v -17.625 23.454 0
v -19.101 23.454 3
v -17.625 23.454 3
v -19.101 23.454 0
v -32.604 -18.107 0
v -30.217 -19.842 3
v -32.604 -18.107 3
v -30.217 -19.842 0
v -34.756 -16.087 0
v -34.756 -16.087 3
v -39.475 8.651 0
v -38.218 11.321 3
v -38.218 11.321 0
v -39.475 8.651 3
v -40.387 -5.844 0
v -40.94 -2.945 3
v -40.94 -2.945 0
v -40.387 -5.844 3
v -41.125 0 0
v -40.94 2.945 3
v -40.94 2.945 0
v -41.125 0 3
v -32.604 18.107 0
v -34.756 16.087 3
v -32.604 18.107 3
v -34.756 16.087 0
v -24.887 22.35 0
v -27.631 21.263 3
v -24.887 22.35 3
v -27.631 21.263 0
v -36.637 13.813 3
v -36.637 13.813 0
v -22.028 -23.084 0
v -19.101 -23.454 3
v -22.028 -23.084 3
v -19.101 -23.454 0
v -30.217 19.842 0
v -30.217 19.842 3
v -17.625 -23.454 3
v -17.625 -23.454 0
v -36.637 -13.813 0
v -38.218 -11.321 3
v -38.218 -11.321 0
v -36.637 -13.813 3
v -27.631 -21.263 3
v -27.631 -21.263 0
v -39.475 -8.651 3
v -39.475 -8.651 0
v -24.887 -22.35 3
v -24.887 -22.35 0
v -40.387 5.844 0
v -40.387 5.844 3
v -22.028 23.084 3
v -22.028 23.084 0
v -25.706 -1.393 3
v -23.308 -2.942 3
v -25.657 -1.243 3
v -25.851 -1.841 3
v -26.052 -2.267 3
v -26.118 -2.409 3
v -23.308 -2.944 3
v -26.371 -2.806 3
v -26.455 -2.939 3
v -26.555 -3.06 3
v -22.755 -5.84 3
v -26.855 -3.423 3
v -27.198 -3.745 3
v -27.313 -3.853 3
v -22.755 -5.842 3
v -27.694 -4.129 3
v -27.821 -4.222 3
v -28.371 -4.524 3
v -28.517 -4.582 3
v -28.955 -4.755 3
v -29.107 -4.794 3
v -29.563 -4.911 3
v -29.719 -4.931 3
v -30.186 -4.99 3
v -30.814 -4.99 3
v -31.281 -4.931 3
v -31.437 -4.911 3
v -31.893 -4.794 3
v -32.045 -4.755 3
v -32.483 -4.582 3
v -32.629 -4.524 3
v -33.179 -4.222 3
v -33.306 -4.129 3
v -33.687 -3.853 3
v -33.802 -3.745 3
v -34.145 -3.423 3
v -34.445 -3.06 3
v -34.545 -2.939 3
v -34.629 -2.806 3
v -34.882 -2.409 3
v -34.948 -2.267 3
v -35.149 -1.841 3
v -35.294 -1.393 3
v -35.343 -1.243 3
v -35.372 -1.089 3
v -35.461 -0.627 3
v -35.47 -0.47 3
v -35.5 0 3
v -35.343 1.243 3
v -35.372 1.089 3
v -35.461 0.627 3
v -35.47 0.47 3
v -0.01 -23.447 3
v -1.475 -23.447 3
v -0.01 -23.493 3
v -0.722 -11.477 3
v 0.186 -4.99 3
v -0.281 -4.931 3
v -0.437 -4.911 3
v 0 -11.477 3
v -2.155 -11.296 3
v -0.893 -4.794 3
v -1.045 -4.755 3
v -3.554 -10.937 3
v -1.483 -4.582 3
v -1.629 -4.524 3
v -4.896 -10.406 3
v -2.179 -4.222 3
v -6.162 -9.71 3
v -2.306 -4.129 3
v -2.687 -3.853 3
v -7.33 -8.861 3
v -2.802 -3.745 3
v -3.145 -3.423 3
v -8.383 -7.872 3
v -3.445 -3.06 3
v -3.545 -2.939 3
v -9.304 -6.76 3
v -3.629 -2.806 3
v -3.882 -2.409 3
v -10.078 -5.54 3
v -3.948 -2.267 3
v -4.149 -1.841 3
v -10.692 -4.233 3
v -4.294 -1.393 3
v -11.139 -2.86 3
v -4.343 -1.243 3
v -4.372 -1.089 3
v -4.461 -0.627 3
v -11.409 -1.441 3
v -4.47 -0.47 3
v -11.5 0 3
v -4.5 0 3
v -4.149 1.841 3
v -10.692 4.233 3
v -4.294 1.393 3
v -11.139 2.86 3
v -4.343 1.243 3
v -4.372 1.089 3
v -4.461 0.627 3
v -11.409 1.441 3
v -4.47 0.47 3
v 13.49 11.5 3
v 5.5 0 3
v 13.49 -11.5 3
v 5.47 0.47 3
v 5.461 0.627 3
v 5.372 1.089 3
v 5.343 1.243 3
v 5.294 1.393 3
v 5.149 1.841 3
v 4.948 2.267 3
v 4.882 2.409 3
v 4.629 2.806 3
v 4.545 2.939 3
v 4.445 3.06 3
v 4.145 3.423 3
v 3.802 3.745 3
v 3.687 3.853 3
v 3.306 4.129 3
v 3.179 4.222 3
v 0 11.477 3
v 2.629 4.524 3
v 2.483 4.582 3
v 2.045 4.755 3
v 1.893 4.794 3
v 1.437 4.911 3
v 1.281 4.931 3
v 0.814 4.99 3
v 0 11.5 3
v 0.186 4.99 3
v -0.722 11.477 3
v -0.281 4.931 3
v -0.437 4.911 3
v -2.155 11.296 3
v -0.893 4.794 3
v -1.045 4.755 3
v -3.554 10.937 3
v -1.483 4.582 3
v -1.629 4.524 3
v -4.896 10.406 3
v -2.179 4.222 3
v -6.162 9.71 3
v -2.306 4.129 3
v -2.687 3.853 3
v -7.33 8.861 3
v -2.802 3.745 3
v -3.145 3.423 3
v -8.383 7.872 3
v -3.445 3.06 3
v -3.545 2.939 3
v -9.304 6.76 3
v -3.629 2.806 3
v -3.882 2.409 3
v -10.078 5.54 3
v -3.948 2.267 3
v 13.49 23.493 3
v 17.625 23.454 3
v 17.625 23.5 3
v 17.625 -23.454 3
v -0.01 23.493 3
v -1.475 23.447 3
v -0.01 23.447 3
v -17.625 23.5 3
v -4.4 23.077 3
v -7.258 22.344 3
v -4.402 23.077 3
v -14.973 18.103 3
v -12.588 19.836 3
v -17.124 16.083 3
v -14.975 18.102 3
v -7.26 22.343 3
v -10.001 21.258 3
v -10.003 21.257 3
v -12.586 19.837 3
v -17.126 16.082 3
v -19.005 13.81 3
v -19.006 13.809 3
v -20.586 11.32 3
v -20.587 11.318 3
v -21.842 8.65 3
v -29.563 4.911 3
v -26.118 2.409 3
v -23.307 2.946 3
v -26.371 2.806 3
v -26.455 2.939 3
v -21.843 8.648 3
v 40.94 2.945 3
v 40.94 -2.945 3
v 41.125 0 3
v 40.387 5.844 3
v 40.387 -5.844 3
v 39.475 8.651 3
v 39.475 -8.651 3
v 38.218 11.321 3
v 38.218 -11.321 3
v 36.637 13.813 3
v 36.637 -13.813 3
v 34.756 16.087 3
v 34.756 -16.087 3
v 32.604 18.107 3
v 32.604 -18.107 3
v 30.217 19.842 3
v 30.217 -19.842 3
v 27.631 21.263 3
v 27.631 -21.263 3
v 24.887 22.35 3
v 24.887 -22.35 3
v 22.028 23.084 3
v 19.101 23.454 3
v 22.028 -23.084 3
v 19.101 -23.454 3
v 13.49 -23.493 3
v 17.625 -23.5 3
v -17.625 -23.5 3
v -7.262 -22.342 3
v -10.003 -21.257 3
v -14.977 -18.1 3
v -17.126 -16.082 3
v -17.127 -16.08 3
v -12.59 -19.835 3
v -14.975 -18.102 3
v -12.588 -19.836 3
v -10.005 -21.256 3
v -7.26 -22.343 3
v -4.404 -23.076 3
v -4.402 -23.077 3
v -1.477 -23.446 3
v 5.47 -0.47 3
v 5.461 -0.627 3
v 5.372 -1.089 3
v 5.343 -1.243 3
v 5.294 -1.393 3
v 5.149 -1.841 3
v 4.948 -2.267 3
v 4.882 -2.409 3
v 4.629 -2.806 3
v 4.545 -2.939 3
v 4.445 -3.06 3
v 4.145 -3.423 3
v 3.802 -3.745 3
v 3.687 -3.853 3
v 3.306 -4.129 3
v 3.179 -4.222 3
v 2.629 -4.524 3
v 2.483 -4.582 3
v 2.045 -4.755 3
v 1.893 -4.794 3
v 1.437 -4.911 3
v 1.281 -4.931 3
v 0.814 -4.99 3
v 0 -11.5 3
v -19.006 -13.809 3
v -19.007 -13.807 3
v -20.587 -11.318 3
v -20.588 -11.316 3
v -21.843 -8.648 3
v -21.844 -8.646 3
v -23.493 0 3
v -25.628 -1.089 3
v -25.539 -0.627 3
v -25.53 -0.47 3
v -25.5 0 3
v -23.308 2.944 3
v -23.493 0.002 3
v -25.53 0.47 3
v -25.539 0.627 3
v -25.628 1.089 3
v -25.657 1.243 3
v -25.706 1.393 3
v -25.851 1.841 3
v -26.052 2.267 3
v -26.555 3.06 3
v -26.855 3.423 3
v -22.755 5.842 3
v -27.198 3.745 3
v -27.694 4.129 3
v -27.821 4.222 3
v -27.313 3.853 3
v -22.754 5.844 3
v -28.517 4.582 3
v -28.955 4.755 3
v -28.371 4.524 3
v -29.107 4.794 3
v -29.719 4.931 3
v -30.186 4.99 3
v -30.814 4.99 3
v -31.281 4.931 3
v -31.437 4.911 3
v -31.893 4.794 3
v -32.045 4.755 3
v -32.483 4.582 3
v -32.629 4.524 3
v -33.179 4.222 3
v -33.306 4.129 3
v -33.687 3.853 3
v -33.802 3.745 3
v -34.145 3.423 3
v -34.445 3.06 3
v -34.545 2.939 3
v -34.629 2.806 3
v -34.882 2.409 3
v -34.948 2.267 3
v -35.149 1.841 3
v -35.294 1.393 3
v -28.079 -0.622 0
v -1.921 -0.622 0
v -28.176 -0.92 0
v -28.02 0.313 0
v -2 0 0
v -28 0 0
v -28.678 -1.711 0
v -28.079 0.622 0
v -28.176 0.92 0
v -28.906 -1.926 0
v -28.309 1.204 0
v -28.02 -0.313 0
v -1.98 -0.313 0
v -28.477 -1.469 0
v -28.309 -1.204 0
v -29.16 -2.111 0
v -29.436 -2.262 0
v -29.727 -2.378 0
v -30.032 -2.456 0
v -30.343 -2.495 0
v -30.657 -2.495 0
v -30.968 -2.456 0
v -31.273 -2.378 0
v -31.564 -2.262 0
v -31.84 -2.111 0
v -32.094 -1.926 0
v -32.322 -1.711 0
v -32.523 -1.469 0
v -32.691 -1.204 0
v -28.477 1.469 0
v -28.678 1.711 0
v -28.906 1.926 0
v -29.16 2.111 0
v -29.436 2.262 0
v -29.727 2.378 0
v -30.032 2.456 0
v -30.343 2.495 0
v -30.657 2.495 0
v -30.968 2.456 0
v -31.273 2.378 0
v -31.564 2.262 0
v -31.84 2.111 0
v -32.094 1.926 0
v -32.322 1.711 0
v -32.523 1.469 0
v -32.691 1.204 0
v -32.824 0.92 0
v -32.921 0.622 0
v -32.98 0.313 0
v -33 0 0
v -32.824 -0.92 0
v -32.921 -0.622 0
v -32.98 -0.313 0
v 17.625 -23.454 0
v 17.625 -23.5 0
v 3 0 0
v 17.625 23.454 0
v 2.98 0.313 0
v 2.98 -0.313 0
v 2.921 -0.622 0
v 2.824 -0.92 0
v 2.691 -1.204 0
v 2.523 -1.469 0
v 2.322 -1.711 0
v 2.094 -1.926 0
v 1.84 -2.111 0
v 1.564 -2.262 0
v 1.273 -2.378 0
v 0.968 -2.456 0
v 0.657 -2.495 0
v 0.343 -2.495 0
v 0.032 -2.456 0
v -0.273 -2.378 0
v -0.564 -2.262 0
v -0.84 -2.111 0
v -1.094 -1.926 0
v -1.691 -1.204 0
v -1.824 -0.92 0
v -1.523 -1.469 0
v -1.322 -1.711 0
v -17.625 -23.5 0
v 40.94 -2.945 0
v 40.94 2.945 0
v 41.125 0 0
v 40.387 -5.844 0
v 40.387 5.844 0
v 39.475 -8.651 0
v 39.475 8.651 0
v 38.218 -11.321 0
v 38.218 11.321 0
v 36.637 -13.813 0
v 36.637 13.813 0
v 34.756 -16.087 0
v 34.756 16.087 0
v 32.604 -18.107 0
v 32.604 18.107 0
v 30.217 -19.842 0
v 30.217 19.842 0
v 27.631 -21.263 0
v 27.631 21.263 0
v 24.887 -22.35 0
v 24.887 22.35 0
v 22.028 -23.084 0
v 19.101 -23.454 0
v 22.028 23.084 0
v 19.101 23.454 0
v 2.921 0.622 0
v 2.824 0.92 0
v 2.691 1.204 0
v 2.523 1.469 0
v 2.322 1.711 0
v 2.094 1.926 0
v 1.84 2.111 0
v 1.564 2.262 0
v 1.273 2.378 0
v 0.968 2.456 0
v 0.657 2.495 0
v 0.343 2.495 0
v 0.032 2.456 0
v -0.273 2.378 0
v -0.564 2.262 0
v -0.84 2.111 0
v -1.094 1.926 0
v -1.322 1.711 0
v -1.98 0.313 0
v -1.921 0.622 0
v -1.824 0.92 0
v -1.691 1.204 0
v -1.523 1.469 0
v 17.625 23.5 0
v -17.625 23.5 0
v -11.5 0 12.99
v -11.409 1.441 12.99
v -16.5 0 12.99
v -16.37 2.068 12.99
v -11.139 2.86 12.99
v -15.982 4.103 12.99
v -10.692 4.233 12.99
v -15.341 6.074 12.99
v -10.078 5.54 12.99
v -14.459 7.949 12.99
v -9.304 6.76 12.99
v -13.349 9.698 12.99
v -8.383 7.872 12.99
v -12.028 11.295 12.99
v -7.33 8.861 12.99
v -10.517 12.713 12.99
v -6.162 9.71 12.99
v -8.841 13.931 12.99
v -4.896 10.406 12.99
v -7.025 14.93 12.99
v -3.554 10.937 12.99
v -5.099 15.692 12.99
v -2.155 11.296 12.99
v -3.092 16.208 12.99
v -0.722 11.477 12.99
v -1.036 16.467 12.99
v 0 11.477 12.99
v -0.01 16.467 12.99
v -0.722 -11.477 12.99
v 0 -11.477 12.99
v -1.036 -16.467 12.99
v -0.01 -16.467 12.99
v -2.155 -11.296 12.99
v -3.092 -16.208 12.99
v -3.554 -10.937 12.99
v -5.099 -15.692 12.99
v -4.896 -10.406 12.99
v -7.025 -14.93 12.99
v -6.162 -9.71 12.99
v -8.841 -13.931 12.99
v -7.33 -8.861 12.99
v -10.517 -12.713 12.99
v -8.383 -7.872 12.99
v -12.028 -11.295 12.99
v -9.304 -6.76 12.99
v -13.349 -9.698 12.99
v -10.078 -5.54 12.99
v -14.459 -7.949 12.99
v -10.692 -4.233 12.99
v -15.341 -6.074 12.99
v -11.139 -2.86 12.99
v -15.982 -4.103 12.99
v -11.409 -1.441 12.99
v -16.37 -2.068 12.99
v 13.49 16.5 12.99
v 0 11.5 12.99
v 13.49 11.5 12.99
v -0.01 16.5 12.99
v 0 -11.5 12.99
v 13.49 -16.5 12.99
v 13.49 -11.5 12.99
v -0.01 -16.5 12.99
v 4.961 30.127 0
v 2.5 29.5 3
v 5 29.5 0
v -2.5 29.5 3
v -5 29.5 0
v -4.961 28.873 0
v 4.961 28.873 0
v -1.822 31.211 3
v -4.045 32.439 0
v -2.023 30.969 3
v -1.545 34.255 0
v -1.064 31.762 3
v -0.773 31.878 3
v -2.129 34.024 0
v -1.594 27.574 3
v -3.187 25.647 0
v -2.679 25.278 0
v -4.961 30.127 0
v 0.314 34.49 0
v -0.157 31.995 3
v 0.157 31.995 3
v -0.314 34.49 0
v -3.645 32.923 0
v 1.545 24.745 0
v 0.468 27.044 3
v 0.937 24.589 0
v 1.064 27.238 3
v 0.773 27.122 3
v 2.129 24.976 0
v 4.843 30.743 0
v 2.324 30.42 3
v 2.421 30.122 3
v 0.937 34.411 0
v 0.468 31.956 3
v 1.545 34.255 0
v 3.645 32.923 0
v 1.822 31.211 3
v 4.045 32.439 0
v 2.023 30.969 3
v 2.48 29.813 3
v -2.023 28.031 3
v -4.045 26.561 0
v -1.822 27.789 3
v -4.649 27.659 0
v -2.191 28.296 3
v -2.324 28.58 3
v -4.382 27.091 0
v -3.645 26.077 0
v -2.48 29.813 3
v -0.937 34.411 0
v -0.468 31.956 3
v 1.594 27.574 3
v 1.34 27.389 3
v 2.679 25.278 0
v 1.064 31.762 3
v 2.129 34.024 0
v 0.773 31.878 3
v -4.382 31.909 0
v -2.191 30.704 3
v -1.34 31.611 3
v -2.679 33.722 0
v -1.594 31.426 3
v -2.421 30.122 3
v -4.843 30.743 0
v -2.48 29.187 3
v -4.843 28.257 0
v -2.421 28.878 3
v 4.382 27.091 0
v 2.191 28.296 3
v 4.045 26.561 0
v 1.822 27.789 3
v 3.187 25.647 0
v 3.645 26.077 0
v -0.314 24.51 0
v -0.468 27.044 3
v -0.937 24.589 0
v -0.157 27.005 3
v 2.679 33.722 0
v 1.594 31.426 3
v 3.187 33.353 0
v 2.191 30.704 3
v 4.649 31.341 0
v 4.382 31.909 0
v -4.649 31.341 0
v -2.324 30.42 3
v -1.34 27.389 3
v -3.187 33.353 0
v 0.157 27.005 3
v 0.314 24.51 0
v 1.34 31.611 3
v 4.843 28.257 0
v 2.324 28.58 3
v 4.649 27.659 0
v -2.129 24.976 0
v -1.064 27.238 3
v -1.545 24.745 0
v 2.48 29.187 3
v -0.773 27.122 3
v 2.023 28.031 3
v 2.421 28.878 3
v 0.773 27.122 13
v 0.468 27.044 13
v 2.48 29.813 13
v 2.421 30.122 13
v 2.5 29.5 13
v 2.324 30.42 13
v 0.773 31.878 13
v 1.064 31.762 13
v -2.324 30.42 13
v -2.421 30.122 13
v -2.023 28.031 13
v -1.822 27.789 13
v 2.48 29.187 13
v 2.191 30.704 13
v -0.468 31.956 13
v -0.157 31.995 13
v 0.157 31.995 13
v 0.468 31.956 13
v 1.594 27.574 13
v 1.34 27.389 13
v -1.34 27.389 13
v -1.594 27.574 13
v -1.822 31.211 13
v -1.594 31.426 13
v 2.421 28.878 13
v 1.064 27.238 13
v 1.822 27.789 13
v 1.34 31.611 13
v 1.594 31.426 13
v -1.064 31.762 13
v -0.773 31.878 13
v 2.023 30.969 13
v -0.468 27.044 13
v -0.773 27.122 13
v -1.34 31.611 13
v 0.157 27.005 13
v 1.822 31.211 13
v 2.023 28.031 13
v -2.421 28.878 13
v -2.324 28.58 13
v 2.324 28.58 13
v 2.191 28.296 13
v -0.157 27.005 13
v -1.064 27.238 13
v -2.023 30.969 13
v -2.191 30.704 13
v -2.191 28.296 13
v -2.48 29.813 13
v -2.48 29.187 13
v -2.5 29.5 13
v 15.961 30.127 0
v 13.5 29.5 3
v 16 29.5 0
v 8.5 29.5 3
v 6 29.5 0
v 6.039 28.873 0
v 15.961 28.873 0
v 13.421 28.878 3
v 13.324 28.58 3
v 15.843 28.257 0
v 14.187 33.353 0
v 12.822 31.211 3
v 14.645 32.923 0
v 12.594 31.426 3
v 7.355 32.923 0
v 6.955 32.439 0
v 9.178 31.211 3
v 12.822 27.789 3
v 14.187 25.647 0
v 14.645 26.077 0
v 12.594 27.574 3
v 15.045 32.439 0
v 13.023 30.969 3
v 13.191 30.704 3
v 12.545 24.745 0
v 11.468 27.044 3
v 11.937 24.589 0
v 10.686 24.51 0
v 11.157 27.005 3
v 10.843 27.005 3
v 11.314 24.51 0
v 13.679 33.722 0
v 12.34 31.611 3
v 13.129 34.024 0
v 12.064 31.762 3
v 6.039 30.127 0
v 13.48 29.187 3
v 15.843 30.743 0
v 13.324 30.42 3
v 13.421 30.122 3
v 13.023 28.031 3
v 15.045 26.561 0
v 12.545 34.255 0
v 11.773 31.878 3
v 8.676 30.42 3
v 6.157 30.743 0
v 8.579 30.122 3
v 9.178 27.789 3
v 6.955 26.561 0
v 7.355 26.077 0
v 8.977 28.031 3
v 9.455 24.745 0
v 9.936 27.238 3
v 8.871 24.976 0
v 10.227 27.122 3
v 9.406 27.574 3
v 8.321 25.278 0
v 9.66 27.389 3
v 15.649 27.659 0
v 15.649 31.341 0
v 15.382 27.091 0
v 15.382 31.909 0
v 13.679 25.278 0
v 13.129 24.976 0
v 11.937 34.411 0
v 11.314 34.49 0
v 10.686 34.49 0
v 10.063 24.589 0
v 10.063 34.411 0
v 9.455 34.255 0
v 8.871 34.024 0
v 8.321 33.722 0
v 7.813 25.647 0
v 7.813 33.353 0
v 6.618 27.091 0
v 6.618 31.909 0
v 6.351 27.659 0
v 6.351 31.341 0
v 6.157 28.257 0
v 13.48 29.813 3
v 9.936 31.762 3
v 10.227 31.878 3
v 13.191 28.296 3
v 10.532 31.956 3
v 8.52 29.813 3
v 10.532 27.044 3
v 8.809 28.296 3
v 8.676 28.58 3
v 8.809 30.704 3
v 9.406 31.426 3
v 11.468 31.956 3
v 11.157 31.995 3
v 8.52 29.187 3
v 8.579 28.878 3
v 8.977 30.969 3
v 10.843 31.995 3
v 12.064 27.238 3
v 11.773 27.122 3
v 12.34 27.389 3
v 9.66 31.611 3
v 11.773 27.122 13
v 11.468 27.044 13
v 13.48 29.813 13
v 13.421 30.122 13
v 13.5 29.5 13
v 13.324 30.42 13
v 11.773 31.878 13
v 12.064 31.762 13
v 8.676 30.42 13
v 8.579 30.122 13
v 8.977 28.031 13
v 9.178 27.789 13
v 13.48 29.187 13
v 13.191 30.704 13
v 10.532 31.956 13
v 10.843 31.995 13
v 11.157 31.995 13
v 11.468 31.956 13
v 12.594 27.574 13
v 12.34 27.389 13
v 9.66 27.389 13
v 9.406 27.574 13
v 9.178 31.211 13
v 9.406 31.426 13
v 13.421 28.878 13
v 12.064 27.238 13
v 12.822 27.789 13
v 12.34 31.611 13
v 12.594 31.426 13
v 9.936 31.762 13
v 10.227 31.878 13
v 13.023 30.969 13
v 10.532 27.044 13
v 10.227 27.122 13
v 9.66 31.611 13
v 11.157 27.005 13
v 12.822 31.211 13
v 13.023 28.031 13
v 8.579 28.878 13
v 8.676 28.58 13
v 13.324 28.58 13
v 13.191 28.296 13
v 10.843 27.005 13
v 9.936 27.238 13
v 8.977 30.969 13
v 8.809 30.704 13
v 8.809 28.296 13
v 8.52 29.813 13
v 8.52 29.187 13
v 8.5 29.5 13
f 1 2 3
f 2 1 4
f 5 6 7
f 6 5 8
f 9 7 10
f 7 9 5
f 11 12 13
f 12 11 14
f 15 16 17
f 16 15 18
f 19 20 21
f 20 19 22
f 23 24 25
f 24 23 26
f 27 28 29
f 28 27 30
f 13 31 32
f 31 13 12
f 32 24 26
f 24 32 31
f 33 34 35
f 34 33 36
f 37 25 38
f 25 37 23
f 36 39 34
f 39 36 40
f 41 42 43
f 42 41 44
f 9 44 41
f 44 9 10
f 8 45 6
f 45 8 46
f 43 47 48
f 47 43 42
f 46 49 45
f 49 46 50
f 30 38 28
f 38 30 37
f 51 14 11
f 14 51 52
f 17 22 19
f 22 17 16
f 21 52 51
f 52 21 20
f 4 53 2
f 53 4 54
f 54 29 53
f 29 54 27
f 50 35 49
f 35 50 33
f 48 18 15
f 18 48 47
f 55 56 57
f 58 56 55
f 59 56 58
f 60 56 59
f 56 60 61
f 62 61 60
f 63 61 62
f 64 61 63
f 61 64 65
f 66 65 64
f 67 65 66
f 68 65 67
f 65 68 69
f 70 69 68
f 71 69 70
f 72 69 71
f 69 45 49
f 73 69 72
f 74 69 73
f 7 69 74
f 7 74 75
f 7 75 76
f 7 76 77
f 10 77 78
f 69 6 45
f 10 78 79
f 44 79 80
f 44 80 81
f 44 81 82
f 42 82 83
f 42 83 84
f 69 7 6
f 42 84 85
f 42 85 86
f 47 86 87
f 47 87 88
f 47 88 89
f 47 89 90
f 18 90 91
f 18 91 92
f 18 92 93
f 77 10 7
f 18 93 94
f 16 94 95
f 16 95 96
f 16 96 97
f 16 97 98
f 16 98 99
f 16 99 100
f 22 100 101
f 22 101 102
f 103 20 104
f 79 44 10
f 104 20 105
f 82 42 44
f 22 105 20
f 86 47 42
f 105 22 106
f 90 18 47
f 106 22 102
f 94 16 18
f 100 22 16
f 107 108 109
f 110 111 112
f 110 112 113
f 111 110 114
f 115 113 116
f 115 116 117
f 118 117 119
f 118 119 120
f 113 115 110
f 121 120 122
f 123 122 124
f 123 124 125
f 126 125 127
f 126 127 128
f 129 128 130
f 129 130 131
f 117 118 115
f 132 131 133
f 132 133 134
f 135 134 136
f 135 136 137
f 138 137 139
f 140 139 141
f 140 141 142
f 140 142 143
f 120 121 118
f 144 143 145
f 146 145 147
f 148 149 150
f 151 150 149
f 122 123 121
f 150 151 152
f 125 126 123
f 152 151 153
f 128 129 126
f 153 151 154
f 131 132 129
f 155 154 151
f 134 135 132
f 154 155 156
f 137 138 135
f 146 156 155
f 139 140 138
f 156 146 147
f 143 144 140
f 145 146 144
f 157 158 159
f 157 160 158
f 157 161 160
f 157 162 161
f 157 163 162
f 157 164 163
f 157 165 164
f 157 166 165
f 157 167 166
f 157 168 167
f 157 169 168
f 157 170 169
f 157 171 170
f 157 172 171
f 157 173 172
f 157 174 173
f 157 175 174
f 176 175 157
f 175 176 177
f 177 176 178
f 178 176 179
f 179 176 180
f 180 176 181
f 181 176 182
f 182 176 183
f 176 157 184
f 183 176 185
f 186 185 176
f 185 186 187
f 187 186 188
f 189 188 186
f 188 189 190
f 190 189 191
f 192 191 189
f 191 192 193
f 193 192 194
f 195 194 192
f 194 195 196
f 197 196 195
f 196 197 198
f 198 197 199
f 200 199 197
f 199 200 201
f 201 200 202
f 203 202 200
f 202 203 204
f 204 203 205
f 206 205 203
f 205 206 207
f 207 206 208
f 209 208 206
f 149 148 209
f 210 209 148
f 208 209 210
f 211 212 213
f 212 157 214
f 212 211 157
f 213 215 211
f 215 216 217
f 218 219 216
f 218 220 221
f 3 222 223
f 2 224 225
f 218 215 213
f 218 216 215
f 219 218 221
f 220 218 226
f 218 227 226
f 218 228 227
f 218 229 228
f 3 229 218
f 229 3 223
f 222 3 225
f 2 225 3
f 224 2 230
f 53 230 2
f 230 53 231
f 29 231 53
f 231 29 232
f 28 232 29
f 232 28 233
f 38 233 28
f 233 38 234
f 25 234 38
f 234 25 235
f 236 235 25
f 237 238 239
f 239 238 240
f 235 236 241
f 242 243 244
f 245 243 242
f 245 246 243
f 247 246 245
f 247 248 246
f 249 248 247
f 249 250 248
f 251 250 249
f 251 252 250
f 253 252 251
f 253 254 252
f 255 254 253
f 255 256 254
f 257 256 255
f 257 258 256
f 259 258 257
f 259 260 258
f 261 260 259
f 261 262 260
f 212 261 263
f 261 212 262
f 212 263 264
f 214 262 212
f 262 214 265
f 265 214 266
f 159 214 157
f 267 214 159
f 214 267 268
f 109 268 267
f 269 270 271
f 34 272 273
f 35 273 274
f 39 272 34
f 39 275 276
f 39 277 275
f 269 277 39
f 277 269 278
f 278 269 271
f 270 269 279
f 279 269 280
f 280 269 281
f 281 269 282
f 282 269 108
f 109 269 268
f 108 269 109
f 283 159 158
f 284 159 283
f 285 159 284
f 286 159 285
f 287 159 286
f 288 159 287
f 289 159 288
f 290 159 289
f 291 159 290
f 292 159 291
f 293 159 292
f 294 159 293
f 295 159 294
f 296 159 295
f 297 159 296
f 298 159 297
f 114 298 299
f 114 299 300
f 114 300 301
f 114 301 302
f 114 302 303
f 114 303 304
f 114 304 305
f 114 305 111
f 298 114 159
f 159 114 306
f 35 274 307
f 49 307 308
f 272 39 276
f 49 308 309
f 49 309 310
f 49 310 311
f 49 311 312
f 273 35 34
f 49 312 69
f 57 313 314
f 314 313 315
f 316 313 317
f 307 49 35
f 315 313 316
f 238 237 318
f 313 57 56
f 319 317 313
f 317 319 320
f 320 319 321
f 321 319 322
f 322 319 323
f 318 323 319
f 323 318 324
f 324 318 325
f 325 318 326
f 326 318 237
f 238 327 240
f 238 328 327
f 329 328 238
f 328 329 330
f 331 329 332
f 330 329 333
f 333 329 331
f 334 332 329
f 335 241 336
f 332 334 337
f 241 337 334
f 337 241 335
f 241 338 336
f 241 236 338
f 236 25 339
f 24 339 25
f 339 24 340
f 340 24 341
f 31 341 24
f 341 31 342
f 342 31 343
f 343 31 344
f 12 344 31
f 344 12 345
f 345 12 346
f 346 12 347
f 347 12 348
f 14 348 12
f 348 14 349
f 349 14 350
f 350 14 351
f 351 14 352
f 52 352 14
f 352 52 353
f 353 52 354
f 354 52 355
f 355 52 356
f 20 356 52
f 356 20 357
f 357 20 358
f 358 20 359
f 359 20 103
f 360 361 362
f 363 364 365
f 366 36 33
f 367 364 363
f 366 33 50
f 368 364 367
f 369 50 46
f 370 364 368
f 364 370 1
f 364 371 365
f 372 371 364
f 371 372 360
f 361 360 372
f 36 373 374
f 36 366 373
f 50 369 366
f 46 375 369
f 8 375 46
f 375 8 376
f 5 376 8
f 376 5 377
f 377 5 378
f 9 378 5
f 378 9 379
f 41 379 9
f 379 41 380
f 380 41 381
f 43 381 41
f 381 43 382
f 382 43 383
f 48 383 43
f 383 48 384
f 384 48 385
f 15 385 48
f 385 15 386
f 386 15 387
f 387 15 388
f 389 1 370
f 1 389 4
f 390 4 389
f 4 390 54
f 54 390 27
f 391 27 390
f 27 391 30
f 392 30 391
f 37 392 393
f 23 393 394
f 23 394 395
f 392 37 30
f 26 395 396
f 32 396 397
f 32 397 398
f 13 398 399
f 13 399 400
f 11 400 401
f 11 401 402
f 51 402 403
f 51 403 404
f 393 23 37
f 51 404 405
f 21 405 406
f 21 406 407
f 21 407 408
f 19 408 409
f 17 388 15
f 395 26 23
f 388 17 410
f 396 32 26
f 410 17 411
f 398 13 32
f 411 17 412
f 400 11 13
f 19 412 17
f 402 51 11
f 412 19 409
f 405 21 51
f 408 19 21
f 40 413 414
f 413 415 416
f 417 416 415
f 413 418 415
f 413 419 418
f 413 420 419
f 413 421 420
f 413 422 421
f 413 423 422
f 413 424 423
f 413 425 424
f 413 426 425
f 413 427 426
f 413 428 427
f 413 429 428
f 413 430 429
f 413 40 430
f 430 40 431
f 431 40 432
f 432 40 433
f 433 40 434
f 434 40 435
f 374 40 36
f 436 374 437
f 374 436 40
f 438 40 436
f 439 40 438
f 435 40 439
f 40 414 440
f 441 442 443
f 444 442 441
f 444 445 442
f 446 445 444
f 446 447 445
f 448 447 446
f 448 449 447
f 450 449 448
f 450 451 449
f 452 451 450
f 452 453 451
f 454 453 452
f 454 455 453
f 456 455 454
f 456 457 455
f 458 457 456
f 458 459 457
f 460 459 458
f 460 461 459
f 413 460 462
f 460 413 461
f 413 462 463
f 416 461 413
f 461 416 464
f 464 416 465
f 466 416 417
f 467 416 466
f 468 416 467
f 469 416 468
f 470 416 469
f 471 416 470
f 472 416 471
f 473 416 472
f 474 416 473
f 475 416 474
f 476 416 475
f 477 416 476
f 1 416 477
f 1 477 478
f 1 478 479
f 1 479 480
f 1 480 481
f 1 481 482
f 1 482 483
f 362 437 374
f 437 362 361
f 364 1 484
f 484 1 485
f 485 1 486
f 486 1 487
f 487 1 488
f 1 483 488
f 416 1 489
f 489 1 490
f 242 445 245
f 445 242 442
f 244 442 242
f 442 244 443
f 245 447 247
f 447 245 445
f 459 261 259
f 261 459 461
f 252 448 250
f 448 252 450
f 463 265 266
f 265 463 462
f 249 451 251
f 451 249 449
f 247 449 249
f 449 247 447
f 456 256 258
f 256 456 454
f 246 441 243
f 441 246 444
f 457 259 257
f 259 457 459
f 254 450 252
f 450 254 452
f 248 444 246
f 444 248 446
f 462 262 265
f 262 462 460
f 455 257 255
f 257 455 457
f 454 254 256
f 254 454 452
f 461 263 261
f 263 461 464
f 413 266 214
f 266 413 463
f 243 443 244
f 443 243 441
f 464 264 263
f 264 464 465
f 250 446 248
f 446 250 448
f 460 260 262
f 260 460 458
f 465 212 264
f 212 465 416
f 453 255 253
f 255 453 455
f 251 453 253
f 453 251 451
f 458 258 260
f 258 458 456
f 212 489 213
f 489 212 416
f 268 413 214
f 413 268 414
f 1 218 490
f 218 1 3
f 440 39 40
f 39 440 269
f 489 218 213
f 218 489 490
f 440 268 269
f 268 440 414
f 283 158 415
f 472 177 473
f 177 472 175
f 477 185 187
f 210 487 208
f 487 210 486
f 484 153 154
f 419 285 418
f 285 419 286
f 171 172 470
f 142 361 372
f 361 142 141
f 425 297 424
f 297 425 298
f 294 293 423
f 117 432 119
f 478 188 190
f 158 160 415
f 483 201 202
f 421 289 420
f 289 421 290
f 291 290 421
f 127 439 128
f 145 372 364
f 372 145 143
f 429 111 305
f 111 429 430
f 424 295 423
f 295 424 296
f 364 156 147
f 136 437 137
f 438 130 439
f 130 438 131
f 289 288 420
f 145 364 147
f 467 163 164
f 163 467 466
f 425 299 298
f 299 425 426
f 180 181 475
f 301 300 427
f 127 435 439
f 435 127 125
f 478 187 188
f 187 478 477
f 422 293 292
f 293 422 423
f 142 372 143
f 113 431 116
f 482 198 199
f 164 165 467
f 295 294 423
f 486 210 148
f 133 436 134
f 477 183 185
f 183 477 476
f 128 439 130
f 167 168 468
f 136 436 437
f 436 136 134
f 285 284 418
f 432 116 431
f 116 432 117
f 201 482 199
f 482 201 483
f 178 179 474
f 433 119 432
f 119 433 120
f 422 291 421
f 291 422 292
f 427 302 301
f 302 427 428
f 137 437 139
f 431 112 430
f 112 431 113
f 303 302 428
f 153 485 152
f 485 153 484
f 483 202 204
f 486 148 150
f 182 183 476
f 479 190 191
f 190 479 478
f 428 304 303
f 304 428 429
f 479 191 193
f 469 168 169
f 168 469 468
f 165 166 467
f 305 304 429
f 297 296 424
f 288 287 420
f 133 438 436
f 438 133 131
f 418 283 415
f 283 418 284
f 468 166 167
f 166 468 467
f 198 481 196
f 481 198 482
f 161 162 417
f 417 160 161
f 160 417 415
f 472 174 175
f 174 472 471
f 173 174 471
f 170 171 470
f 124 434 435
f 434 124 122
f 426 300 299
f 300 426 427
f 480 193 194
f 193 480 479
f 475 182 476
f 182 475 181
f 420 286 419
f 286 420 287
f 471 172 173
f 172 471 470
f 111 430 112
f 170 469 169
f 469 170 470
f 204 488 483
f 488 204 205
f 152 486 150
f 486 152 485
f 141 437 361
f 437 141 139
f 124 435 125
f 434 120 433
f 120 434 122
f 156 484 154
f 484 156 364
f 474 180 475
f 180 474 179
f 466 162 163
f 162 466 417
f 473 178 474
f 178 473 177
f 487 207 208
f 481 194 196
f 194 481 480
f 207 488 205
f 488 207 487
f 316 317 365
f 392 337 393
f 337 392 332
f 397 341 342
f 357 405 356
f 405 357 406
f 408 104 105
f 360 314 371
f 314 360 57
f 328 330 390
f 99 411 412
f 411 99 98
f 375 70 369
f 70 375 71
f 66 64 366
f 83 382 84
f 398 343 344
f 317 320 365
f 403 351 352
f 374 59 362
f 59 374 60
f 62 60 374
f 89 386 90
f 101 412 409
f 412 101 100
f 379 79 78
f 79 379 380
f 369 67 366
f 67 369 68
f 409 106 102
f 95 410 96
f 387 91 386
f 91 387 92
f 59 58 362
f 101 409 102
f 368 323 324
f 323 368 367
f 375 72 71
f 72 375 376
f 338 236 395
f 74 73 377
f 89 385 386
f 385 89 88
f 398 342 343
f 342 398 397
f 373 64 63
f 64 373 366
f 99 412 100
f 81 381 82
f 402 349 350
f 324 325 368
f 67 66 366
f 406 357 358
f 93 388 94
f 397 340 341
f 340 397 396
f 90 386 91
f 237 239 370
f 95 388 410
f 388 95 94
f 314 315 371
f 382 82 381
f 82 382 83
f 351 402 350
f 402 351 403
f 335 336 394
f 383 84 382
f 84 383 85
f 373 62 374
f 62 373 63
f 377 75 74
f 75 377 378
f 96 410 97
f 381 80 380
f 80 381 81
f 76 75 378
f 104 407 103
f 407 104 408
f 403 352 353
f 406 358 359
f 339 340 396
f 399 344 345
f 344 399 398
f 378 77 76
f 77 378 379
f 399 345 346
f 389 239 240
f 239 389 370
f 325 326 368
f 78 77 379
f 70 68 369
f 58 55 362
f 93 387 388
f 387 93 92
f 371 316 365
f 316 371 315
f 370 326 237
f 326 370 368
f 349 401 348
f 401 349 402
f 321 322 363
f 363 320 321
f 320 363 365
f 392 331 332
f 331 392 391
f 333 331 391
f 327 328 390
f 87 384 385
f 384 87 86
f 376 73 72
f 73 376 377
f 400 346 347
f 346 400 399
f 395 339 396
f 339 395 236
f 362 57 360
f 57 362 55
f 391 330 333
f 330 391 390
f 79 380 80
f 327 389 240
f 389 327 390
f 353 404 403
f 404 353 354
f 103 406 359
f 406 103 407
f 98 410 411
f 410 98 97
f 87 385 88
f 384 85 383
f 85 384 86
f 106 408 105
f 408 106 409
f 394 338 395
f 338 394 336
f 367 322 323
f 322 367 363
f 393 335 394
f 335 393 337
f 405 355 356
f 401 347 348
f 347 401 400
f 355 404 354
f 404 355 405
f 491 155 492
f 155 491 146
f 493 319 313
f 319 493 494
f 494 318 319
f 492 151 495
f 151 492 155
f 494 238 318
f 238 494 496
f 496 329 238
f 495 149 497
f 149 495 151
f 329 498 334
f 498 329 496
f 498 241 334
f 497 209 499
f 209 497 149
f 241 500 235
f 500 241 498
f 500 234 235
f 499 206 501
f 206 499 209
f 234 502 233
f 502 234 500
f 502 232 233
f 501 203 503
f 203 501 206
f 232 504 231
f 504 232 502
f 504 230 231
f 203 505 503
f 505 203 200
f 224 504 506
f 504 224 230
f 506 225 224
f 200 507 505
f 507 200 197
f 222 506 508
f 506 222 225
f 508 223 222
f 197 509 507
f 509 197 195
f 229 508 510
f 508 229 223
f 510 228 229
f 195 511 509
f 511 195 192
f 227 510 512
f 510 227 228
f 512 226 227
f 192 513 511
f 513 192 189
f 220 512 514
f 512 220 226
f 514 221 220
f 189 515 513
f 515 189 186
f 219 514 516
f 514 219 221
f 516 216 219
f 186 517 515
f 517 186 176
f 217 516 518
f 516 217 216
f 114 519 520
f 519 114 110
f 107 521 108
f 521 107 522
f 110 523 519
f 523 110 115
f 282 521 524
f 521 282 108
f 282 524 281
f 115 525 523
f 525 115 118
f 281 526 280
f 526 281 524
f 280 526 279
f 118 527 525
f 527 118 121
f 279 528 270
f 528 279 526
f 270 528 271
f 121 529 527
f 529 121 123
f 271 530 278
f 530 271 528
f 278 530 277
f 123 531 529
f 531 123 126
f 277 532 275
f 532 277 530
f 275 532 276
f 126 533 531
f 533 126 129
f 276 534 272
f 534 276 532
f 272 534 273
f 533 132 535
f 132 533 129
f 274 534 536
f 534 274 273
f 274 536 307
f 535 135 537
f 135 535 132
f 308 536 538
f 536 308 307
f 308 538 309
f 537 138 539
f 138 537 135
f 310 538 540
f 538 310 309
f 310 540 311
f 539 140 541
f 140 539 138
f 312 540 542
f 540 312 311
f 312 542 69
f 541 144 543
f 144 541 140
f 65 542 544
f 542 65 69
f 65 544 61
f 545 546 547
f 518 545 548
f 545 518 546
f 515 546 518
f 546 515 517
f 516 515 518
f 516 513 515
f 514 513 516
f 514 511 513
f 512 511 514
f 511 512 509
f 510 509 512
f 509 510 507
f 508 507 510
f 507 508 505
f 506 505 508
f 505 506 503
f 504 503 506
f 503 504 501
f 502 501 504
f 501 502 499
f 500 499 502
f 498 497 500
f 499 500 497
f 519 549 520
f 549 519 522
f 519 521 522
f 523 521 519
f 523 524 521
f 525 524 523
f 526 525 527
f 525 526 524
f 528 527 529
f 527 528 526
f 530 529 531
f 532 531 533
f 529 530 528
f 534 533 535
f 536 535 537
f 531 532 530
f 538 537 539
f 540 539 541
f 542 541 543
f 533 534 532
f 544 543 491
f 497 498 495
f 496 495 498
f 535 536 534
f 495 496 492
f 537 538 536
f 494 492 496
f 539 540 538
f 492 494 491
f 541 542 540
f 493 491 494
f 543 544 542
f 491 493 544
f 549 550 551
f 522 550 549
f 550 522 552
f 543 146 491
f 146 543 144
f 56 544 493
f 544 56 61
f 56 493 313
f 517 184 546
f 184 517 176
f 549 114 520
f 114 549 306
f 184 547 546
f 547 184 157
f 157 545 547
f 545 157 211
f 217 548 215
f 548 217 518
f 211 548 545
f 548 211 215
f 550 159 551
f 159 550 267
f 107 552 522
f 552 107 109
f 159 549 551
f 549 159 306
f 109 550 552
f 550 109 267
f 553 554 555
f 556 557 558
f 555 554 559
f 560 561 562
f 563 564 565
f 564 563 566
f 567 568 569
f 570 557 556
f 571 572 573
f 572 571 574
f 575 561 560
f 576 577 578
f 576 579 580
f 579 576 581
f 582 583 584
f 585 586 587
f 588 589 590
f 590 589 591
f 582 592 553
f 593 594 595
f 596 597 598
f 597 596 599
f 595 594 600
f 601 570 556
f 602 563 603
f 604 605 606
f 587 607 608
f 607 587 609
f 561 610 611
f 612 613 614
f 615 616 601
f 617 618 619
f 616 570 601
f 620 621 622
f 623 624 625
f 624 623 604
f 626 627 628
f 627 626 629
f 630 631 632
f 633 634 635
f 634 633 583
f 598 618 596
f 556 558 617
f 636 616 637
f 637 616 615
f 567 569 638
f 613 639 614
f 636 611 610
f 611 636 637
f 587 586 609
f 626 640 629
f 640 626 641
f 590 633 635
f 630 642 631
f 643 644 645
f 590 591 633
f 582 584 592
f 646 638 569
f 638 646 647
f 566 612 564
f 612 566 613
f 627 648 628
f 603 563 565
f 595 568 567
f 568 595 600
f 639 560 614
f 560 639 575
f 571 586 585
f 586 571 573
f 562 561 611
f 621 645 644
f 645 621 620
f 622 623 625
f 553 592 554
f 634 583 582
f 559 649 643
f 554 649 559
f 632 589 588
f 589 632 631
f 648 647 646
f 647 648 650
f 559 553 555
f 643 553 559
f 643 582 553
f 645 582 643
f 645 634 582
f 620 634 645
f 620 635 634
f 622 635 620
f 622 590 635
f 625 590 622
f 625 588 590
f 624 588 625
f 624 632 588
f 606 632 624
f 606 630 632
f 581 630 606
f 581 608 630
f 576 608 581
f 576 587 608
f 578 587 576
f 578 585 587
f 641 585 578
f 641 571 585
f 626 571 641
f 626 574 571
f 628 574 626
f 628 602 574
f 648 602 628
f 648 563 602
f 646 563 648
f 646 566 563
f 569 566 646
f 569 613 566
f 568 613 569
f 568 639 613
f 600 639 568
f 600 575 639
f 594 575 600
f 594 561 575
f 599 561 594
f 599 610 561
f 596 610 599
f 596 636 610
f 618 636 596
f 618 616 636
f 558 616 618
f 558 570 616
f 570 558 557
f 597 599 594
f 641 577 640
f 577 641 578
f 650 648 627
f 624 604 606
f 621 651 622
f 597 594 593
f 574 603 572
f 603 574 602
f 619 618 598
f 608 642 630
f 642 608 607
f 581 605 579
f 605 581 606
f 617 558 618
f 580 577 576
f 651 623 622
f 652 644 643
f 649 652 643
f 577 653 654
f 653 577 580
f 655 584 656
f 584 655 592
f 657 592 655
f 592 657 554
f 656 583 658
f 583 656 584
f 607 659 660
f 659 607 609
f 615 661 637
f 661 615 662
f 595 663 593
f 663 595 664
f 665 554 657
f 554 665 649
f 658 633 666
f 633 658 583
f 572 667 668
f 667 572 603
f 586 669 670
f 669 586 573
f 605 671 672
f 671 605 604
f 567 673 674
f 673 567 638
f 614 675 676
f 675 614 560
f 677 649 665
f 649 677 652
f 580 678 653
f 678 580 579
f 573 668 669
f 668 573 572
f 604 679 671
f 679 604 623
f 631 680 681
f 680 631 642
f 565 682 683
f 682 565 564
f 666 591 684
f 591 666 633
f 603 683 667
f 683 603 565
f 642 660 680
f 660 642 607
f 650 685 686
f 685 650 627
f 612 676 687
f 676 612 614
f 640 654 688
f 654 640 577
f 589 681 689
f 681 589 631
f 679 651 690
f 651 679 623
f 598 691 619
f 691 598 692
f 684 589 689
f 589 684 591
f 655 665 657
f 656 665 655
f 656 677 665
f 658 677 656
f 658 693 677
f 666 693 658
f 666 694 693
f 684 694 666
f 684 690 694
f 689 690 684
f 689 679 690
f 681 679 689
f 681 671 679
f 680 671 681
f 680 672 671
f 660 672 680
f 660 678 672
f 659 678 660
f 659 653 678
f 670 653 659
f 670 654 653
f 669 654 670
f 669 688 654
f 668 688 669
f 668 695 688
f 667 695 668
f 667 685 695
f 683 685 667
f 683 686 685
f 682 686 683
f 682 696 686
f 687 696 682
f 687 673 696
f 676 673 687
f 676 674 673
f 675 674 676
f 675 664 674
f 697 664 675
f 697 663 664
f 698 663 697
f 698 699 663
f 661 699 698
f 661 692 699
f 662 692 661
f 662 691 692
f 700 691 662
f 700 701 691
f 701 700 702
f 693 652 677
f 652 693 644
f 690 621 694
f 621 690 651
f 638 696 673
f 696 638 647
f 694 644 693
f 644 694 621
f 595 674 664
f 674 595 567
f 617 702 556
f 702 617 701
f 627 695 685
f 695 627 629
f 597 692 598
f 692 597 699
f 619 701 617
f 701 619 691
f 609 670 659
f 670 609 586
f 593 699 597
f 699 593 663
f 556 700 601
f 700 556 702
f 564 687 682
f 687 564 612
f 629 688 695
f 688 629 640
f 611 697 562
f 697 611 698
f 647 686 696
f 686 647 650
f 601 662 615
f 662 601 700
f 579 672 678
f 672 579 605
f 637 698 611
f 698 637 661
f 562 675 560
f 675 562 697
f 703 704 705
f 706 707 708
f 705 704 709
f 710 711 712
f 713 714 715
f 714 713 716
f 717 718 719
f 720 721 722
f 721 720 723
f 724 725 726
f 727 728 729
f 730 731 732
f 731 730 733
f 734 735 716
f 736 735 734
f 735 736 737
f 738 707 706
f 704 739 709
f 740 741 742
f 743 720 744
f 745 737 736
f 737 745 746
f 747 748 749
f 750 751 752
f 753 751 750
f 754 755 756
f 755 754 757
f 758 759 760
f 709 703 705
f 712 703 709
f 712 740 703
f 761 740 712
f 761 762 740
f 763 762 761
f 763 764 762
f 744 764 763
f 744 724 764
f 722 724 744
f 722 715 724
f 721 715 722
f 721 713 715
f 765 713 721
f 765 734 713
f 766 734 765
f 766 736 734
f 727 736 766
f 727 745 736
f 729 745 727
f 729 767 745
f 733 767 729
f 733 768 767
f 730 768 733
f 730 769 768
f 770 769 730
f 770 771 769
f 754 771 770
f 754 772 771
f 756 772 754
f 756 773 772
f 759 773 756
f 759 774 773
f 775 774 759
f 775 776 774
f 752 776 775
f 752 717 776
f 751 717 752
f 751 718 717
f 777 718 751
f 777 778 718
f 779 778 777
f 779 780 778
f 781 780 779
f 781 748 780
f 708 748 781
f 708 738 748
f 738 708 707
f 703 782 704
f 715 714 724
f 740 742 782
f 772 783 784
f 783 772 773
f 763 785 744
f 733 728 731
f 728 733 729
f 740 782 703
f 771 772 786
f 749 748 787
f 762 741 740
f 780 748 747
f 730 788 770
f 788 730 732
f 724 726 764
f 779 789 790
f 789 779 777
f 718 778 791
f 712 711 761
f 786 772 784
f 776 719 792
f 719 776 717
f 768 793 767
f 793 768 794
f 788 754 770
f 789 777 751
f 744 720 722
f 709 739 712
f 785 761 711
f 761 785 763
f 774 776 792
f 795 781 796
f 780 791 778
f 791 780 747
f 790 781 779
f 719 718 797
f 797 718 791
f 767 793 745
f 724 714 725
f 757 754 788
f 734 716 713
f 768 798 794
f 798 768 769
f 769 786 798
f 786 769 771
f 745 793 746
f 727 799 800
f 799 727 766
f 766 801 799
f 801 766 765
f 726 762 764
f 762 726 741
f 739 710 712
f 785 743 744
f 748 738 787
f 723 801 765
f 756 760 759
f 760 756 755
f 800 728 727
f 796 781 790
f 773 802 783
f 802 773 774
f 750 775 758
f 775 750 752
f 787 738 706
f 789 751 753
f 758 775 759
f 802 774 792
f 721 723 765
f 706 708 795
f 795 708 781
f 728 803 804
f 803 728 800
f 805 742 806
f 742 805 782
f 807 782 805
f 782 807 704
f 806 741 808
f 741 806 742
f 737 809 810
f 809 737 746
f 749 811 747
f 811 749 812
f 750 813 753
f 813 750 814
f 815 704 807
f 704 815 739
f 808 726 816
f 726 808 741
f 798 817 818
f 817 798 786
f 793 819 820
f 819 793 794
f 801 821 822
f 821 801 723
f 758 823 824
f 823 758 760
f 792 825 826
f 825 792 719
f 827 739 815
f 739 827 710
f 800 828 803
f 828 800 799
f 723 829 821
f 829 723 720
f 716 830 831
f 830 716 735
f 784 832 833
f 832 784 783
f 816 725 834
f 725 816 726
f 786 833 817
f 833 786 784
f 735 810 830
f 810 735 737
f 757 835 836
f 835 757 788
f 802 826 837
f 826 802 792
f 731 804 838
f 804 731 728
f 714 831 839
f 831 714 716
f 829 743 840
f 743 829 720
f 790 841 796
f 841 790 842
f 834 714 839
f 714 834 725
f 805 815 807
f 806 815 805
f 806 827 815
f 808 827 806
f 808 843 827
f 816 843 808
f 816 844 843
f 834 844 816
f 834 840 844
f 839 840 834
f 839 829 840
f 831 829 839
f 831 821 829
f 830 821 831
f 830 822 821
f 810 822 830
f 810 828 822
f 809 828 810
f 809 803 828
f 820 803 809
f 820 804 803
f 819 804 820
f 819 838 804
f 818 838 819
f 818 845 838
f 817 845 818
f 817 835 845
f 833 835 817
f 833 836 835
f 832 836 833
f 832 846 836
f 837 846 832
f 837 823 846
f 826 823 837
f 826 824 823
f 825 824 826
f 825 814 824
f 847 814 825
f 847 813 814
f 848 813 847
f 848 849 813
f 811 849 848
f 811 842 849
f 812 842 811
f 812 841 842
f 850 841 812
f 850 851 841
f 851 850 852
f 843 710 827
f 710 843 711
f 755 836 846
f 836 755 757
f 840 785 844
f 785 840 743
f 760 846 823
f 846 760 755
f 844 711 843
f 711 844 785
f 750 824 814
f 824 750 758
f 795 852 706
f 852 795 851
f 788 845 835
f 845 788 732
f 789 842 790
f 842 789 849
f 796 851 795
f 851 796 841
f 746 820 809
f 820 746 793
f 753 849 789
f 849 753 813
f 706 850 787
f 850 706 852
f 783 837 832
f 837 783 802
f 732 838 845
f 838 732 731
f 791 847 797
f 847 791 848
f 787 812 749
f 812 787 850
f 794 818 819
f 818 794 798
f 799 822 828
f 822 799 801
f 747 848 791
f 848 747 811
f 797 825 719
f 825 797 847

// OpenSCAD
//  Closet bar holder 
// version 2 - Added support for boxes.scad 
// version 1 - Original
$fn = 50;
include <MCAD/boxes.scad>  // from https://github.com/elmom/MCAD/blob/master/boxes.scad

// this is how big we want the opening to be
// the wooded pole for my closet was 33mm diamater so I made the opening 36mm

bar_radius = 23/2;
plug_depth = 10;
plug_radius = 2.5;
plug_distance = 26; // distance inbetween plugs
plugs_offset = -15; 

holder_bottom_thns = 12; //9; //
holder_top_thns = 5;
base_width = bar_radius*2+holder_bottom_thns*2;
base_depth = 3;

o = 0.01; // slight overlap
distance = 1;


base();
translate([0,0,base_depth-o]) holder();

translate([0,base_width/2+plug_radius*2+distance,0]) {
  plug();
  translate([plug_radius*4+distance,0,0]) plug();
}

// this is the piece that sticks out to holds the bar
// we will be extruding this
module wall_mold() { 
  polygon(points=[[0,0],[0,10],[holder_top_thns,10],[holder_bottom_thns,0]]);
}
module holder() {
  difference()
  {
    // this is a circle extrusion of the wall_mold()
    rotate_extrude(convexity = 10) translate([bar_radius, 0, 0]) wall_mold();
    // we only want the bottom 1/2 so lets take take away the top half
    translate([base_width/2,0,15/2-0.1]) cube([base_width,base_width,15],center=true);
  }
  // Here is the "straight" extrusions for the wall_mold()
  translate([-o,bar_radius,0]) rotate([90,0,90]) 
    linear_extrude( height=bar_radius+2) wall_mold();
  translate([bar_radius+2-o,-bar_radius,0]) rotate([90,0,-90]) 
    linear_extrude(height=bar_radius+2) wall_mold();
}
module base() {
  difference()
  {
     translate([0,0,base_depth/2]) roundedBox([base_width*1.75,base_width, base_depth], base_width/2, true);
     translate([plugs_offset,0,0]) {
      //
      rotate([180,0,0]) translate([0,0,-base_depth]) {
        translate([plug_distance/2+plug_radius,0,0]) plug(true);
        translate([-plug_distance/2-plug_radius,0,0]) plug(true);
      }
    }
  }
}
module plug(remove=false) {
  if(remove) {
    translate([0,0,-base_depth]) cylinder(base_depth*2,plug_radius*3,plug_radius);
  } else {
    cylinder(base_depth,plug_radius*2,plug_radius);
  }
  translate([0,0,base_depth-o])
    cylinder(plug_depth+o,plug_radius,plug_radius);
}
